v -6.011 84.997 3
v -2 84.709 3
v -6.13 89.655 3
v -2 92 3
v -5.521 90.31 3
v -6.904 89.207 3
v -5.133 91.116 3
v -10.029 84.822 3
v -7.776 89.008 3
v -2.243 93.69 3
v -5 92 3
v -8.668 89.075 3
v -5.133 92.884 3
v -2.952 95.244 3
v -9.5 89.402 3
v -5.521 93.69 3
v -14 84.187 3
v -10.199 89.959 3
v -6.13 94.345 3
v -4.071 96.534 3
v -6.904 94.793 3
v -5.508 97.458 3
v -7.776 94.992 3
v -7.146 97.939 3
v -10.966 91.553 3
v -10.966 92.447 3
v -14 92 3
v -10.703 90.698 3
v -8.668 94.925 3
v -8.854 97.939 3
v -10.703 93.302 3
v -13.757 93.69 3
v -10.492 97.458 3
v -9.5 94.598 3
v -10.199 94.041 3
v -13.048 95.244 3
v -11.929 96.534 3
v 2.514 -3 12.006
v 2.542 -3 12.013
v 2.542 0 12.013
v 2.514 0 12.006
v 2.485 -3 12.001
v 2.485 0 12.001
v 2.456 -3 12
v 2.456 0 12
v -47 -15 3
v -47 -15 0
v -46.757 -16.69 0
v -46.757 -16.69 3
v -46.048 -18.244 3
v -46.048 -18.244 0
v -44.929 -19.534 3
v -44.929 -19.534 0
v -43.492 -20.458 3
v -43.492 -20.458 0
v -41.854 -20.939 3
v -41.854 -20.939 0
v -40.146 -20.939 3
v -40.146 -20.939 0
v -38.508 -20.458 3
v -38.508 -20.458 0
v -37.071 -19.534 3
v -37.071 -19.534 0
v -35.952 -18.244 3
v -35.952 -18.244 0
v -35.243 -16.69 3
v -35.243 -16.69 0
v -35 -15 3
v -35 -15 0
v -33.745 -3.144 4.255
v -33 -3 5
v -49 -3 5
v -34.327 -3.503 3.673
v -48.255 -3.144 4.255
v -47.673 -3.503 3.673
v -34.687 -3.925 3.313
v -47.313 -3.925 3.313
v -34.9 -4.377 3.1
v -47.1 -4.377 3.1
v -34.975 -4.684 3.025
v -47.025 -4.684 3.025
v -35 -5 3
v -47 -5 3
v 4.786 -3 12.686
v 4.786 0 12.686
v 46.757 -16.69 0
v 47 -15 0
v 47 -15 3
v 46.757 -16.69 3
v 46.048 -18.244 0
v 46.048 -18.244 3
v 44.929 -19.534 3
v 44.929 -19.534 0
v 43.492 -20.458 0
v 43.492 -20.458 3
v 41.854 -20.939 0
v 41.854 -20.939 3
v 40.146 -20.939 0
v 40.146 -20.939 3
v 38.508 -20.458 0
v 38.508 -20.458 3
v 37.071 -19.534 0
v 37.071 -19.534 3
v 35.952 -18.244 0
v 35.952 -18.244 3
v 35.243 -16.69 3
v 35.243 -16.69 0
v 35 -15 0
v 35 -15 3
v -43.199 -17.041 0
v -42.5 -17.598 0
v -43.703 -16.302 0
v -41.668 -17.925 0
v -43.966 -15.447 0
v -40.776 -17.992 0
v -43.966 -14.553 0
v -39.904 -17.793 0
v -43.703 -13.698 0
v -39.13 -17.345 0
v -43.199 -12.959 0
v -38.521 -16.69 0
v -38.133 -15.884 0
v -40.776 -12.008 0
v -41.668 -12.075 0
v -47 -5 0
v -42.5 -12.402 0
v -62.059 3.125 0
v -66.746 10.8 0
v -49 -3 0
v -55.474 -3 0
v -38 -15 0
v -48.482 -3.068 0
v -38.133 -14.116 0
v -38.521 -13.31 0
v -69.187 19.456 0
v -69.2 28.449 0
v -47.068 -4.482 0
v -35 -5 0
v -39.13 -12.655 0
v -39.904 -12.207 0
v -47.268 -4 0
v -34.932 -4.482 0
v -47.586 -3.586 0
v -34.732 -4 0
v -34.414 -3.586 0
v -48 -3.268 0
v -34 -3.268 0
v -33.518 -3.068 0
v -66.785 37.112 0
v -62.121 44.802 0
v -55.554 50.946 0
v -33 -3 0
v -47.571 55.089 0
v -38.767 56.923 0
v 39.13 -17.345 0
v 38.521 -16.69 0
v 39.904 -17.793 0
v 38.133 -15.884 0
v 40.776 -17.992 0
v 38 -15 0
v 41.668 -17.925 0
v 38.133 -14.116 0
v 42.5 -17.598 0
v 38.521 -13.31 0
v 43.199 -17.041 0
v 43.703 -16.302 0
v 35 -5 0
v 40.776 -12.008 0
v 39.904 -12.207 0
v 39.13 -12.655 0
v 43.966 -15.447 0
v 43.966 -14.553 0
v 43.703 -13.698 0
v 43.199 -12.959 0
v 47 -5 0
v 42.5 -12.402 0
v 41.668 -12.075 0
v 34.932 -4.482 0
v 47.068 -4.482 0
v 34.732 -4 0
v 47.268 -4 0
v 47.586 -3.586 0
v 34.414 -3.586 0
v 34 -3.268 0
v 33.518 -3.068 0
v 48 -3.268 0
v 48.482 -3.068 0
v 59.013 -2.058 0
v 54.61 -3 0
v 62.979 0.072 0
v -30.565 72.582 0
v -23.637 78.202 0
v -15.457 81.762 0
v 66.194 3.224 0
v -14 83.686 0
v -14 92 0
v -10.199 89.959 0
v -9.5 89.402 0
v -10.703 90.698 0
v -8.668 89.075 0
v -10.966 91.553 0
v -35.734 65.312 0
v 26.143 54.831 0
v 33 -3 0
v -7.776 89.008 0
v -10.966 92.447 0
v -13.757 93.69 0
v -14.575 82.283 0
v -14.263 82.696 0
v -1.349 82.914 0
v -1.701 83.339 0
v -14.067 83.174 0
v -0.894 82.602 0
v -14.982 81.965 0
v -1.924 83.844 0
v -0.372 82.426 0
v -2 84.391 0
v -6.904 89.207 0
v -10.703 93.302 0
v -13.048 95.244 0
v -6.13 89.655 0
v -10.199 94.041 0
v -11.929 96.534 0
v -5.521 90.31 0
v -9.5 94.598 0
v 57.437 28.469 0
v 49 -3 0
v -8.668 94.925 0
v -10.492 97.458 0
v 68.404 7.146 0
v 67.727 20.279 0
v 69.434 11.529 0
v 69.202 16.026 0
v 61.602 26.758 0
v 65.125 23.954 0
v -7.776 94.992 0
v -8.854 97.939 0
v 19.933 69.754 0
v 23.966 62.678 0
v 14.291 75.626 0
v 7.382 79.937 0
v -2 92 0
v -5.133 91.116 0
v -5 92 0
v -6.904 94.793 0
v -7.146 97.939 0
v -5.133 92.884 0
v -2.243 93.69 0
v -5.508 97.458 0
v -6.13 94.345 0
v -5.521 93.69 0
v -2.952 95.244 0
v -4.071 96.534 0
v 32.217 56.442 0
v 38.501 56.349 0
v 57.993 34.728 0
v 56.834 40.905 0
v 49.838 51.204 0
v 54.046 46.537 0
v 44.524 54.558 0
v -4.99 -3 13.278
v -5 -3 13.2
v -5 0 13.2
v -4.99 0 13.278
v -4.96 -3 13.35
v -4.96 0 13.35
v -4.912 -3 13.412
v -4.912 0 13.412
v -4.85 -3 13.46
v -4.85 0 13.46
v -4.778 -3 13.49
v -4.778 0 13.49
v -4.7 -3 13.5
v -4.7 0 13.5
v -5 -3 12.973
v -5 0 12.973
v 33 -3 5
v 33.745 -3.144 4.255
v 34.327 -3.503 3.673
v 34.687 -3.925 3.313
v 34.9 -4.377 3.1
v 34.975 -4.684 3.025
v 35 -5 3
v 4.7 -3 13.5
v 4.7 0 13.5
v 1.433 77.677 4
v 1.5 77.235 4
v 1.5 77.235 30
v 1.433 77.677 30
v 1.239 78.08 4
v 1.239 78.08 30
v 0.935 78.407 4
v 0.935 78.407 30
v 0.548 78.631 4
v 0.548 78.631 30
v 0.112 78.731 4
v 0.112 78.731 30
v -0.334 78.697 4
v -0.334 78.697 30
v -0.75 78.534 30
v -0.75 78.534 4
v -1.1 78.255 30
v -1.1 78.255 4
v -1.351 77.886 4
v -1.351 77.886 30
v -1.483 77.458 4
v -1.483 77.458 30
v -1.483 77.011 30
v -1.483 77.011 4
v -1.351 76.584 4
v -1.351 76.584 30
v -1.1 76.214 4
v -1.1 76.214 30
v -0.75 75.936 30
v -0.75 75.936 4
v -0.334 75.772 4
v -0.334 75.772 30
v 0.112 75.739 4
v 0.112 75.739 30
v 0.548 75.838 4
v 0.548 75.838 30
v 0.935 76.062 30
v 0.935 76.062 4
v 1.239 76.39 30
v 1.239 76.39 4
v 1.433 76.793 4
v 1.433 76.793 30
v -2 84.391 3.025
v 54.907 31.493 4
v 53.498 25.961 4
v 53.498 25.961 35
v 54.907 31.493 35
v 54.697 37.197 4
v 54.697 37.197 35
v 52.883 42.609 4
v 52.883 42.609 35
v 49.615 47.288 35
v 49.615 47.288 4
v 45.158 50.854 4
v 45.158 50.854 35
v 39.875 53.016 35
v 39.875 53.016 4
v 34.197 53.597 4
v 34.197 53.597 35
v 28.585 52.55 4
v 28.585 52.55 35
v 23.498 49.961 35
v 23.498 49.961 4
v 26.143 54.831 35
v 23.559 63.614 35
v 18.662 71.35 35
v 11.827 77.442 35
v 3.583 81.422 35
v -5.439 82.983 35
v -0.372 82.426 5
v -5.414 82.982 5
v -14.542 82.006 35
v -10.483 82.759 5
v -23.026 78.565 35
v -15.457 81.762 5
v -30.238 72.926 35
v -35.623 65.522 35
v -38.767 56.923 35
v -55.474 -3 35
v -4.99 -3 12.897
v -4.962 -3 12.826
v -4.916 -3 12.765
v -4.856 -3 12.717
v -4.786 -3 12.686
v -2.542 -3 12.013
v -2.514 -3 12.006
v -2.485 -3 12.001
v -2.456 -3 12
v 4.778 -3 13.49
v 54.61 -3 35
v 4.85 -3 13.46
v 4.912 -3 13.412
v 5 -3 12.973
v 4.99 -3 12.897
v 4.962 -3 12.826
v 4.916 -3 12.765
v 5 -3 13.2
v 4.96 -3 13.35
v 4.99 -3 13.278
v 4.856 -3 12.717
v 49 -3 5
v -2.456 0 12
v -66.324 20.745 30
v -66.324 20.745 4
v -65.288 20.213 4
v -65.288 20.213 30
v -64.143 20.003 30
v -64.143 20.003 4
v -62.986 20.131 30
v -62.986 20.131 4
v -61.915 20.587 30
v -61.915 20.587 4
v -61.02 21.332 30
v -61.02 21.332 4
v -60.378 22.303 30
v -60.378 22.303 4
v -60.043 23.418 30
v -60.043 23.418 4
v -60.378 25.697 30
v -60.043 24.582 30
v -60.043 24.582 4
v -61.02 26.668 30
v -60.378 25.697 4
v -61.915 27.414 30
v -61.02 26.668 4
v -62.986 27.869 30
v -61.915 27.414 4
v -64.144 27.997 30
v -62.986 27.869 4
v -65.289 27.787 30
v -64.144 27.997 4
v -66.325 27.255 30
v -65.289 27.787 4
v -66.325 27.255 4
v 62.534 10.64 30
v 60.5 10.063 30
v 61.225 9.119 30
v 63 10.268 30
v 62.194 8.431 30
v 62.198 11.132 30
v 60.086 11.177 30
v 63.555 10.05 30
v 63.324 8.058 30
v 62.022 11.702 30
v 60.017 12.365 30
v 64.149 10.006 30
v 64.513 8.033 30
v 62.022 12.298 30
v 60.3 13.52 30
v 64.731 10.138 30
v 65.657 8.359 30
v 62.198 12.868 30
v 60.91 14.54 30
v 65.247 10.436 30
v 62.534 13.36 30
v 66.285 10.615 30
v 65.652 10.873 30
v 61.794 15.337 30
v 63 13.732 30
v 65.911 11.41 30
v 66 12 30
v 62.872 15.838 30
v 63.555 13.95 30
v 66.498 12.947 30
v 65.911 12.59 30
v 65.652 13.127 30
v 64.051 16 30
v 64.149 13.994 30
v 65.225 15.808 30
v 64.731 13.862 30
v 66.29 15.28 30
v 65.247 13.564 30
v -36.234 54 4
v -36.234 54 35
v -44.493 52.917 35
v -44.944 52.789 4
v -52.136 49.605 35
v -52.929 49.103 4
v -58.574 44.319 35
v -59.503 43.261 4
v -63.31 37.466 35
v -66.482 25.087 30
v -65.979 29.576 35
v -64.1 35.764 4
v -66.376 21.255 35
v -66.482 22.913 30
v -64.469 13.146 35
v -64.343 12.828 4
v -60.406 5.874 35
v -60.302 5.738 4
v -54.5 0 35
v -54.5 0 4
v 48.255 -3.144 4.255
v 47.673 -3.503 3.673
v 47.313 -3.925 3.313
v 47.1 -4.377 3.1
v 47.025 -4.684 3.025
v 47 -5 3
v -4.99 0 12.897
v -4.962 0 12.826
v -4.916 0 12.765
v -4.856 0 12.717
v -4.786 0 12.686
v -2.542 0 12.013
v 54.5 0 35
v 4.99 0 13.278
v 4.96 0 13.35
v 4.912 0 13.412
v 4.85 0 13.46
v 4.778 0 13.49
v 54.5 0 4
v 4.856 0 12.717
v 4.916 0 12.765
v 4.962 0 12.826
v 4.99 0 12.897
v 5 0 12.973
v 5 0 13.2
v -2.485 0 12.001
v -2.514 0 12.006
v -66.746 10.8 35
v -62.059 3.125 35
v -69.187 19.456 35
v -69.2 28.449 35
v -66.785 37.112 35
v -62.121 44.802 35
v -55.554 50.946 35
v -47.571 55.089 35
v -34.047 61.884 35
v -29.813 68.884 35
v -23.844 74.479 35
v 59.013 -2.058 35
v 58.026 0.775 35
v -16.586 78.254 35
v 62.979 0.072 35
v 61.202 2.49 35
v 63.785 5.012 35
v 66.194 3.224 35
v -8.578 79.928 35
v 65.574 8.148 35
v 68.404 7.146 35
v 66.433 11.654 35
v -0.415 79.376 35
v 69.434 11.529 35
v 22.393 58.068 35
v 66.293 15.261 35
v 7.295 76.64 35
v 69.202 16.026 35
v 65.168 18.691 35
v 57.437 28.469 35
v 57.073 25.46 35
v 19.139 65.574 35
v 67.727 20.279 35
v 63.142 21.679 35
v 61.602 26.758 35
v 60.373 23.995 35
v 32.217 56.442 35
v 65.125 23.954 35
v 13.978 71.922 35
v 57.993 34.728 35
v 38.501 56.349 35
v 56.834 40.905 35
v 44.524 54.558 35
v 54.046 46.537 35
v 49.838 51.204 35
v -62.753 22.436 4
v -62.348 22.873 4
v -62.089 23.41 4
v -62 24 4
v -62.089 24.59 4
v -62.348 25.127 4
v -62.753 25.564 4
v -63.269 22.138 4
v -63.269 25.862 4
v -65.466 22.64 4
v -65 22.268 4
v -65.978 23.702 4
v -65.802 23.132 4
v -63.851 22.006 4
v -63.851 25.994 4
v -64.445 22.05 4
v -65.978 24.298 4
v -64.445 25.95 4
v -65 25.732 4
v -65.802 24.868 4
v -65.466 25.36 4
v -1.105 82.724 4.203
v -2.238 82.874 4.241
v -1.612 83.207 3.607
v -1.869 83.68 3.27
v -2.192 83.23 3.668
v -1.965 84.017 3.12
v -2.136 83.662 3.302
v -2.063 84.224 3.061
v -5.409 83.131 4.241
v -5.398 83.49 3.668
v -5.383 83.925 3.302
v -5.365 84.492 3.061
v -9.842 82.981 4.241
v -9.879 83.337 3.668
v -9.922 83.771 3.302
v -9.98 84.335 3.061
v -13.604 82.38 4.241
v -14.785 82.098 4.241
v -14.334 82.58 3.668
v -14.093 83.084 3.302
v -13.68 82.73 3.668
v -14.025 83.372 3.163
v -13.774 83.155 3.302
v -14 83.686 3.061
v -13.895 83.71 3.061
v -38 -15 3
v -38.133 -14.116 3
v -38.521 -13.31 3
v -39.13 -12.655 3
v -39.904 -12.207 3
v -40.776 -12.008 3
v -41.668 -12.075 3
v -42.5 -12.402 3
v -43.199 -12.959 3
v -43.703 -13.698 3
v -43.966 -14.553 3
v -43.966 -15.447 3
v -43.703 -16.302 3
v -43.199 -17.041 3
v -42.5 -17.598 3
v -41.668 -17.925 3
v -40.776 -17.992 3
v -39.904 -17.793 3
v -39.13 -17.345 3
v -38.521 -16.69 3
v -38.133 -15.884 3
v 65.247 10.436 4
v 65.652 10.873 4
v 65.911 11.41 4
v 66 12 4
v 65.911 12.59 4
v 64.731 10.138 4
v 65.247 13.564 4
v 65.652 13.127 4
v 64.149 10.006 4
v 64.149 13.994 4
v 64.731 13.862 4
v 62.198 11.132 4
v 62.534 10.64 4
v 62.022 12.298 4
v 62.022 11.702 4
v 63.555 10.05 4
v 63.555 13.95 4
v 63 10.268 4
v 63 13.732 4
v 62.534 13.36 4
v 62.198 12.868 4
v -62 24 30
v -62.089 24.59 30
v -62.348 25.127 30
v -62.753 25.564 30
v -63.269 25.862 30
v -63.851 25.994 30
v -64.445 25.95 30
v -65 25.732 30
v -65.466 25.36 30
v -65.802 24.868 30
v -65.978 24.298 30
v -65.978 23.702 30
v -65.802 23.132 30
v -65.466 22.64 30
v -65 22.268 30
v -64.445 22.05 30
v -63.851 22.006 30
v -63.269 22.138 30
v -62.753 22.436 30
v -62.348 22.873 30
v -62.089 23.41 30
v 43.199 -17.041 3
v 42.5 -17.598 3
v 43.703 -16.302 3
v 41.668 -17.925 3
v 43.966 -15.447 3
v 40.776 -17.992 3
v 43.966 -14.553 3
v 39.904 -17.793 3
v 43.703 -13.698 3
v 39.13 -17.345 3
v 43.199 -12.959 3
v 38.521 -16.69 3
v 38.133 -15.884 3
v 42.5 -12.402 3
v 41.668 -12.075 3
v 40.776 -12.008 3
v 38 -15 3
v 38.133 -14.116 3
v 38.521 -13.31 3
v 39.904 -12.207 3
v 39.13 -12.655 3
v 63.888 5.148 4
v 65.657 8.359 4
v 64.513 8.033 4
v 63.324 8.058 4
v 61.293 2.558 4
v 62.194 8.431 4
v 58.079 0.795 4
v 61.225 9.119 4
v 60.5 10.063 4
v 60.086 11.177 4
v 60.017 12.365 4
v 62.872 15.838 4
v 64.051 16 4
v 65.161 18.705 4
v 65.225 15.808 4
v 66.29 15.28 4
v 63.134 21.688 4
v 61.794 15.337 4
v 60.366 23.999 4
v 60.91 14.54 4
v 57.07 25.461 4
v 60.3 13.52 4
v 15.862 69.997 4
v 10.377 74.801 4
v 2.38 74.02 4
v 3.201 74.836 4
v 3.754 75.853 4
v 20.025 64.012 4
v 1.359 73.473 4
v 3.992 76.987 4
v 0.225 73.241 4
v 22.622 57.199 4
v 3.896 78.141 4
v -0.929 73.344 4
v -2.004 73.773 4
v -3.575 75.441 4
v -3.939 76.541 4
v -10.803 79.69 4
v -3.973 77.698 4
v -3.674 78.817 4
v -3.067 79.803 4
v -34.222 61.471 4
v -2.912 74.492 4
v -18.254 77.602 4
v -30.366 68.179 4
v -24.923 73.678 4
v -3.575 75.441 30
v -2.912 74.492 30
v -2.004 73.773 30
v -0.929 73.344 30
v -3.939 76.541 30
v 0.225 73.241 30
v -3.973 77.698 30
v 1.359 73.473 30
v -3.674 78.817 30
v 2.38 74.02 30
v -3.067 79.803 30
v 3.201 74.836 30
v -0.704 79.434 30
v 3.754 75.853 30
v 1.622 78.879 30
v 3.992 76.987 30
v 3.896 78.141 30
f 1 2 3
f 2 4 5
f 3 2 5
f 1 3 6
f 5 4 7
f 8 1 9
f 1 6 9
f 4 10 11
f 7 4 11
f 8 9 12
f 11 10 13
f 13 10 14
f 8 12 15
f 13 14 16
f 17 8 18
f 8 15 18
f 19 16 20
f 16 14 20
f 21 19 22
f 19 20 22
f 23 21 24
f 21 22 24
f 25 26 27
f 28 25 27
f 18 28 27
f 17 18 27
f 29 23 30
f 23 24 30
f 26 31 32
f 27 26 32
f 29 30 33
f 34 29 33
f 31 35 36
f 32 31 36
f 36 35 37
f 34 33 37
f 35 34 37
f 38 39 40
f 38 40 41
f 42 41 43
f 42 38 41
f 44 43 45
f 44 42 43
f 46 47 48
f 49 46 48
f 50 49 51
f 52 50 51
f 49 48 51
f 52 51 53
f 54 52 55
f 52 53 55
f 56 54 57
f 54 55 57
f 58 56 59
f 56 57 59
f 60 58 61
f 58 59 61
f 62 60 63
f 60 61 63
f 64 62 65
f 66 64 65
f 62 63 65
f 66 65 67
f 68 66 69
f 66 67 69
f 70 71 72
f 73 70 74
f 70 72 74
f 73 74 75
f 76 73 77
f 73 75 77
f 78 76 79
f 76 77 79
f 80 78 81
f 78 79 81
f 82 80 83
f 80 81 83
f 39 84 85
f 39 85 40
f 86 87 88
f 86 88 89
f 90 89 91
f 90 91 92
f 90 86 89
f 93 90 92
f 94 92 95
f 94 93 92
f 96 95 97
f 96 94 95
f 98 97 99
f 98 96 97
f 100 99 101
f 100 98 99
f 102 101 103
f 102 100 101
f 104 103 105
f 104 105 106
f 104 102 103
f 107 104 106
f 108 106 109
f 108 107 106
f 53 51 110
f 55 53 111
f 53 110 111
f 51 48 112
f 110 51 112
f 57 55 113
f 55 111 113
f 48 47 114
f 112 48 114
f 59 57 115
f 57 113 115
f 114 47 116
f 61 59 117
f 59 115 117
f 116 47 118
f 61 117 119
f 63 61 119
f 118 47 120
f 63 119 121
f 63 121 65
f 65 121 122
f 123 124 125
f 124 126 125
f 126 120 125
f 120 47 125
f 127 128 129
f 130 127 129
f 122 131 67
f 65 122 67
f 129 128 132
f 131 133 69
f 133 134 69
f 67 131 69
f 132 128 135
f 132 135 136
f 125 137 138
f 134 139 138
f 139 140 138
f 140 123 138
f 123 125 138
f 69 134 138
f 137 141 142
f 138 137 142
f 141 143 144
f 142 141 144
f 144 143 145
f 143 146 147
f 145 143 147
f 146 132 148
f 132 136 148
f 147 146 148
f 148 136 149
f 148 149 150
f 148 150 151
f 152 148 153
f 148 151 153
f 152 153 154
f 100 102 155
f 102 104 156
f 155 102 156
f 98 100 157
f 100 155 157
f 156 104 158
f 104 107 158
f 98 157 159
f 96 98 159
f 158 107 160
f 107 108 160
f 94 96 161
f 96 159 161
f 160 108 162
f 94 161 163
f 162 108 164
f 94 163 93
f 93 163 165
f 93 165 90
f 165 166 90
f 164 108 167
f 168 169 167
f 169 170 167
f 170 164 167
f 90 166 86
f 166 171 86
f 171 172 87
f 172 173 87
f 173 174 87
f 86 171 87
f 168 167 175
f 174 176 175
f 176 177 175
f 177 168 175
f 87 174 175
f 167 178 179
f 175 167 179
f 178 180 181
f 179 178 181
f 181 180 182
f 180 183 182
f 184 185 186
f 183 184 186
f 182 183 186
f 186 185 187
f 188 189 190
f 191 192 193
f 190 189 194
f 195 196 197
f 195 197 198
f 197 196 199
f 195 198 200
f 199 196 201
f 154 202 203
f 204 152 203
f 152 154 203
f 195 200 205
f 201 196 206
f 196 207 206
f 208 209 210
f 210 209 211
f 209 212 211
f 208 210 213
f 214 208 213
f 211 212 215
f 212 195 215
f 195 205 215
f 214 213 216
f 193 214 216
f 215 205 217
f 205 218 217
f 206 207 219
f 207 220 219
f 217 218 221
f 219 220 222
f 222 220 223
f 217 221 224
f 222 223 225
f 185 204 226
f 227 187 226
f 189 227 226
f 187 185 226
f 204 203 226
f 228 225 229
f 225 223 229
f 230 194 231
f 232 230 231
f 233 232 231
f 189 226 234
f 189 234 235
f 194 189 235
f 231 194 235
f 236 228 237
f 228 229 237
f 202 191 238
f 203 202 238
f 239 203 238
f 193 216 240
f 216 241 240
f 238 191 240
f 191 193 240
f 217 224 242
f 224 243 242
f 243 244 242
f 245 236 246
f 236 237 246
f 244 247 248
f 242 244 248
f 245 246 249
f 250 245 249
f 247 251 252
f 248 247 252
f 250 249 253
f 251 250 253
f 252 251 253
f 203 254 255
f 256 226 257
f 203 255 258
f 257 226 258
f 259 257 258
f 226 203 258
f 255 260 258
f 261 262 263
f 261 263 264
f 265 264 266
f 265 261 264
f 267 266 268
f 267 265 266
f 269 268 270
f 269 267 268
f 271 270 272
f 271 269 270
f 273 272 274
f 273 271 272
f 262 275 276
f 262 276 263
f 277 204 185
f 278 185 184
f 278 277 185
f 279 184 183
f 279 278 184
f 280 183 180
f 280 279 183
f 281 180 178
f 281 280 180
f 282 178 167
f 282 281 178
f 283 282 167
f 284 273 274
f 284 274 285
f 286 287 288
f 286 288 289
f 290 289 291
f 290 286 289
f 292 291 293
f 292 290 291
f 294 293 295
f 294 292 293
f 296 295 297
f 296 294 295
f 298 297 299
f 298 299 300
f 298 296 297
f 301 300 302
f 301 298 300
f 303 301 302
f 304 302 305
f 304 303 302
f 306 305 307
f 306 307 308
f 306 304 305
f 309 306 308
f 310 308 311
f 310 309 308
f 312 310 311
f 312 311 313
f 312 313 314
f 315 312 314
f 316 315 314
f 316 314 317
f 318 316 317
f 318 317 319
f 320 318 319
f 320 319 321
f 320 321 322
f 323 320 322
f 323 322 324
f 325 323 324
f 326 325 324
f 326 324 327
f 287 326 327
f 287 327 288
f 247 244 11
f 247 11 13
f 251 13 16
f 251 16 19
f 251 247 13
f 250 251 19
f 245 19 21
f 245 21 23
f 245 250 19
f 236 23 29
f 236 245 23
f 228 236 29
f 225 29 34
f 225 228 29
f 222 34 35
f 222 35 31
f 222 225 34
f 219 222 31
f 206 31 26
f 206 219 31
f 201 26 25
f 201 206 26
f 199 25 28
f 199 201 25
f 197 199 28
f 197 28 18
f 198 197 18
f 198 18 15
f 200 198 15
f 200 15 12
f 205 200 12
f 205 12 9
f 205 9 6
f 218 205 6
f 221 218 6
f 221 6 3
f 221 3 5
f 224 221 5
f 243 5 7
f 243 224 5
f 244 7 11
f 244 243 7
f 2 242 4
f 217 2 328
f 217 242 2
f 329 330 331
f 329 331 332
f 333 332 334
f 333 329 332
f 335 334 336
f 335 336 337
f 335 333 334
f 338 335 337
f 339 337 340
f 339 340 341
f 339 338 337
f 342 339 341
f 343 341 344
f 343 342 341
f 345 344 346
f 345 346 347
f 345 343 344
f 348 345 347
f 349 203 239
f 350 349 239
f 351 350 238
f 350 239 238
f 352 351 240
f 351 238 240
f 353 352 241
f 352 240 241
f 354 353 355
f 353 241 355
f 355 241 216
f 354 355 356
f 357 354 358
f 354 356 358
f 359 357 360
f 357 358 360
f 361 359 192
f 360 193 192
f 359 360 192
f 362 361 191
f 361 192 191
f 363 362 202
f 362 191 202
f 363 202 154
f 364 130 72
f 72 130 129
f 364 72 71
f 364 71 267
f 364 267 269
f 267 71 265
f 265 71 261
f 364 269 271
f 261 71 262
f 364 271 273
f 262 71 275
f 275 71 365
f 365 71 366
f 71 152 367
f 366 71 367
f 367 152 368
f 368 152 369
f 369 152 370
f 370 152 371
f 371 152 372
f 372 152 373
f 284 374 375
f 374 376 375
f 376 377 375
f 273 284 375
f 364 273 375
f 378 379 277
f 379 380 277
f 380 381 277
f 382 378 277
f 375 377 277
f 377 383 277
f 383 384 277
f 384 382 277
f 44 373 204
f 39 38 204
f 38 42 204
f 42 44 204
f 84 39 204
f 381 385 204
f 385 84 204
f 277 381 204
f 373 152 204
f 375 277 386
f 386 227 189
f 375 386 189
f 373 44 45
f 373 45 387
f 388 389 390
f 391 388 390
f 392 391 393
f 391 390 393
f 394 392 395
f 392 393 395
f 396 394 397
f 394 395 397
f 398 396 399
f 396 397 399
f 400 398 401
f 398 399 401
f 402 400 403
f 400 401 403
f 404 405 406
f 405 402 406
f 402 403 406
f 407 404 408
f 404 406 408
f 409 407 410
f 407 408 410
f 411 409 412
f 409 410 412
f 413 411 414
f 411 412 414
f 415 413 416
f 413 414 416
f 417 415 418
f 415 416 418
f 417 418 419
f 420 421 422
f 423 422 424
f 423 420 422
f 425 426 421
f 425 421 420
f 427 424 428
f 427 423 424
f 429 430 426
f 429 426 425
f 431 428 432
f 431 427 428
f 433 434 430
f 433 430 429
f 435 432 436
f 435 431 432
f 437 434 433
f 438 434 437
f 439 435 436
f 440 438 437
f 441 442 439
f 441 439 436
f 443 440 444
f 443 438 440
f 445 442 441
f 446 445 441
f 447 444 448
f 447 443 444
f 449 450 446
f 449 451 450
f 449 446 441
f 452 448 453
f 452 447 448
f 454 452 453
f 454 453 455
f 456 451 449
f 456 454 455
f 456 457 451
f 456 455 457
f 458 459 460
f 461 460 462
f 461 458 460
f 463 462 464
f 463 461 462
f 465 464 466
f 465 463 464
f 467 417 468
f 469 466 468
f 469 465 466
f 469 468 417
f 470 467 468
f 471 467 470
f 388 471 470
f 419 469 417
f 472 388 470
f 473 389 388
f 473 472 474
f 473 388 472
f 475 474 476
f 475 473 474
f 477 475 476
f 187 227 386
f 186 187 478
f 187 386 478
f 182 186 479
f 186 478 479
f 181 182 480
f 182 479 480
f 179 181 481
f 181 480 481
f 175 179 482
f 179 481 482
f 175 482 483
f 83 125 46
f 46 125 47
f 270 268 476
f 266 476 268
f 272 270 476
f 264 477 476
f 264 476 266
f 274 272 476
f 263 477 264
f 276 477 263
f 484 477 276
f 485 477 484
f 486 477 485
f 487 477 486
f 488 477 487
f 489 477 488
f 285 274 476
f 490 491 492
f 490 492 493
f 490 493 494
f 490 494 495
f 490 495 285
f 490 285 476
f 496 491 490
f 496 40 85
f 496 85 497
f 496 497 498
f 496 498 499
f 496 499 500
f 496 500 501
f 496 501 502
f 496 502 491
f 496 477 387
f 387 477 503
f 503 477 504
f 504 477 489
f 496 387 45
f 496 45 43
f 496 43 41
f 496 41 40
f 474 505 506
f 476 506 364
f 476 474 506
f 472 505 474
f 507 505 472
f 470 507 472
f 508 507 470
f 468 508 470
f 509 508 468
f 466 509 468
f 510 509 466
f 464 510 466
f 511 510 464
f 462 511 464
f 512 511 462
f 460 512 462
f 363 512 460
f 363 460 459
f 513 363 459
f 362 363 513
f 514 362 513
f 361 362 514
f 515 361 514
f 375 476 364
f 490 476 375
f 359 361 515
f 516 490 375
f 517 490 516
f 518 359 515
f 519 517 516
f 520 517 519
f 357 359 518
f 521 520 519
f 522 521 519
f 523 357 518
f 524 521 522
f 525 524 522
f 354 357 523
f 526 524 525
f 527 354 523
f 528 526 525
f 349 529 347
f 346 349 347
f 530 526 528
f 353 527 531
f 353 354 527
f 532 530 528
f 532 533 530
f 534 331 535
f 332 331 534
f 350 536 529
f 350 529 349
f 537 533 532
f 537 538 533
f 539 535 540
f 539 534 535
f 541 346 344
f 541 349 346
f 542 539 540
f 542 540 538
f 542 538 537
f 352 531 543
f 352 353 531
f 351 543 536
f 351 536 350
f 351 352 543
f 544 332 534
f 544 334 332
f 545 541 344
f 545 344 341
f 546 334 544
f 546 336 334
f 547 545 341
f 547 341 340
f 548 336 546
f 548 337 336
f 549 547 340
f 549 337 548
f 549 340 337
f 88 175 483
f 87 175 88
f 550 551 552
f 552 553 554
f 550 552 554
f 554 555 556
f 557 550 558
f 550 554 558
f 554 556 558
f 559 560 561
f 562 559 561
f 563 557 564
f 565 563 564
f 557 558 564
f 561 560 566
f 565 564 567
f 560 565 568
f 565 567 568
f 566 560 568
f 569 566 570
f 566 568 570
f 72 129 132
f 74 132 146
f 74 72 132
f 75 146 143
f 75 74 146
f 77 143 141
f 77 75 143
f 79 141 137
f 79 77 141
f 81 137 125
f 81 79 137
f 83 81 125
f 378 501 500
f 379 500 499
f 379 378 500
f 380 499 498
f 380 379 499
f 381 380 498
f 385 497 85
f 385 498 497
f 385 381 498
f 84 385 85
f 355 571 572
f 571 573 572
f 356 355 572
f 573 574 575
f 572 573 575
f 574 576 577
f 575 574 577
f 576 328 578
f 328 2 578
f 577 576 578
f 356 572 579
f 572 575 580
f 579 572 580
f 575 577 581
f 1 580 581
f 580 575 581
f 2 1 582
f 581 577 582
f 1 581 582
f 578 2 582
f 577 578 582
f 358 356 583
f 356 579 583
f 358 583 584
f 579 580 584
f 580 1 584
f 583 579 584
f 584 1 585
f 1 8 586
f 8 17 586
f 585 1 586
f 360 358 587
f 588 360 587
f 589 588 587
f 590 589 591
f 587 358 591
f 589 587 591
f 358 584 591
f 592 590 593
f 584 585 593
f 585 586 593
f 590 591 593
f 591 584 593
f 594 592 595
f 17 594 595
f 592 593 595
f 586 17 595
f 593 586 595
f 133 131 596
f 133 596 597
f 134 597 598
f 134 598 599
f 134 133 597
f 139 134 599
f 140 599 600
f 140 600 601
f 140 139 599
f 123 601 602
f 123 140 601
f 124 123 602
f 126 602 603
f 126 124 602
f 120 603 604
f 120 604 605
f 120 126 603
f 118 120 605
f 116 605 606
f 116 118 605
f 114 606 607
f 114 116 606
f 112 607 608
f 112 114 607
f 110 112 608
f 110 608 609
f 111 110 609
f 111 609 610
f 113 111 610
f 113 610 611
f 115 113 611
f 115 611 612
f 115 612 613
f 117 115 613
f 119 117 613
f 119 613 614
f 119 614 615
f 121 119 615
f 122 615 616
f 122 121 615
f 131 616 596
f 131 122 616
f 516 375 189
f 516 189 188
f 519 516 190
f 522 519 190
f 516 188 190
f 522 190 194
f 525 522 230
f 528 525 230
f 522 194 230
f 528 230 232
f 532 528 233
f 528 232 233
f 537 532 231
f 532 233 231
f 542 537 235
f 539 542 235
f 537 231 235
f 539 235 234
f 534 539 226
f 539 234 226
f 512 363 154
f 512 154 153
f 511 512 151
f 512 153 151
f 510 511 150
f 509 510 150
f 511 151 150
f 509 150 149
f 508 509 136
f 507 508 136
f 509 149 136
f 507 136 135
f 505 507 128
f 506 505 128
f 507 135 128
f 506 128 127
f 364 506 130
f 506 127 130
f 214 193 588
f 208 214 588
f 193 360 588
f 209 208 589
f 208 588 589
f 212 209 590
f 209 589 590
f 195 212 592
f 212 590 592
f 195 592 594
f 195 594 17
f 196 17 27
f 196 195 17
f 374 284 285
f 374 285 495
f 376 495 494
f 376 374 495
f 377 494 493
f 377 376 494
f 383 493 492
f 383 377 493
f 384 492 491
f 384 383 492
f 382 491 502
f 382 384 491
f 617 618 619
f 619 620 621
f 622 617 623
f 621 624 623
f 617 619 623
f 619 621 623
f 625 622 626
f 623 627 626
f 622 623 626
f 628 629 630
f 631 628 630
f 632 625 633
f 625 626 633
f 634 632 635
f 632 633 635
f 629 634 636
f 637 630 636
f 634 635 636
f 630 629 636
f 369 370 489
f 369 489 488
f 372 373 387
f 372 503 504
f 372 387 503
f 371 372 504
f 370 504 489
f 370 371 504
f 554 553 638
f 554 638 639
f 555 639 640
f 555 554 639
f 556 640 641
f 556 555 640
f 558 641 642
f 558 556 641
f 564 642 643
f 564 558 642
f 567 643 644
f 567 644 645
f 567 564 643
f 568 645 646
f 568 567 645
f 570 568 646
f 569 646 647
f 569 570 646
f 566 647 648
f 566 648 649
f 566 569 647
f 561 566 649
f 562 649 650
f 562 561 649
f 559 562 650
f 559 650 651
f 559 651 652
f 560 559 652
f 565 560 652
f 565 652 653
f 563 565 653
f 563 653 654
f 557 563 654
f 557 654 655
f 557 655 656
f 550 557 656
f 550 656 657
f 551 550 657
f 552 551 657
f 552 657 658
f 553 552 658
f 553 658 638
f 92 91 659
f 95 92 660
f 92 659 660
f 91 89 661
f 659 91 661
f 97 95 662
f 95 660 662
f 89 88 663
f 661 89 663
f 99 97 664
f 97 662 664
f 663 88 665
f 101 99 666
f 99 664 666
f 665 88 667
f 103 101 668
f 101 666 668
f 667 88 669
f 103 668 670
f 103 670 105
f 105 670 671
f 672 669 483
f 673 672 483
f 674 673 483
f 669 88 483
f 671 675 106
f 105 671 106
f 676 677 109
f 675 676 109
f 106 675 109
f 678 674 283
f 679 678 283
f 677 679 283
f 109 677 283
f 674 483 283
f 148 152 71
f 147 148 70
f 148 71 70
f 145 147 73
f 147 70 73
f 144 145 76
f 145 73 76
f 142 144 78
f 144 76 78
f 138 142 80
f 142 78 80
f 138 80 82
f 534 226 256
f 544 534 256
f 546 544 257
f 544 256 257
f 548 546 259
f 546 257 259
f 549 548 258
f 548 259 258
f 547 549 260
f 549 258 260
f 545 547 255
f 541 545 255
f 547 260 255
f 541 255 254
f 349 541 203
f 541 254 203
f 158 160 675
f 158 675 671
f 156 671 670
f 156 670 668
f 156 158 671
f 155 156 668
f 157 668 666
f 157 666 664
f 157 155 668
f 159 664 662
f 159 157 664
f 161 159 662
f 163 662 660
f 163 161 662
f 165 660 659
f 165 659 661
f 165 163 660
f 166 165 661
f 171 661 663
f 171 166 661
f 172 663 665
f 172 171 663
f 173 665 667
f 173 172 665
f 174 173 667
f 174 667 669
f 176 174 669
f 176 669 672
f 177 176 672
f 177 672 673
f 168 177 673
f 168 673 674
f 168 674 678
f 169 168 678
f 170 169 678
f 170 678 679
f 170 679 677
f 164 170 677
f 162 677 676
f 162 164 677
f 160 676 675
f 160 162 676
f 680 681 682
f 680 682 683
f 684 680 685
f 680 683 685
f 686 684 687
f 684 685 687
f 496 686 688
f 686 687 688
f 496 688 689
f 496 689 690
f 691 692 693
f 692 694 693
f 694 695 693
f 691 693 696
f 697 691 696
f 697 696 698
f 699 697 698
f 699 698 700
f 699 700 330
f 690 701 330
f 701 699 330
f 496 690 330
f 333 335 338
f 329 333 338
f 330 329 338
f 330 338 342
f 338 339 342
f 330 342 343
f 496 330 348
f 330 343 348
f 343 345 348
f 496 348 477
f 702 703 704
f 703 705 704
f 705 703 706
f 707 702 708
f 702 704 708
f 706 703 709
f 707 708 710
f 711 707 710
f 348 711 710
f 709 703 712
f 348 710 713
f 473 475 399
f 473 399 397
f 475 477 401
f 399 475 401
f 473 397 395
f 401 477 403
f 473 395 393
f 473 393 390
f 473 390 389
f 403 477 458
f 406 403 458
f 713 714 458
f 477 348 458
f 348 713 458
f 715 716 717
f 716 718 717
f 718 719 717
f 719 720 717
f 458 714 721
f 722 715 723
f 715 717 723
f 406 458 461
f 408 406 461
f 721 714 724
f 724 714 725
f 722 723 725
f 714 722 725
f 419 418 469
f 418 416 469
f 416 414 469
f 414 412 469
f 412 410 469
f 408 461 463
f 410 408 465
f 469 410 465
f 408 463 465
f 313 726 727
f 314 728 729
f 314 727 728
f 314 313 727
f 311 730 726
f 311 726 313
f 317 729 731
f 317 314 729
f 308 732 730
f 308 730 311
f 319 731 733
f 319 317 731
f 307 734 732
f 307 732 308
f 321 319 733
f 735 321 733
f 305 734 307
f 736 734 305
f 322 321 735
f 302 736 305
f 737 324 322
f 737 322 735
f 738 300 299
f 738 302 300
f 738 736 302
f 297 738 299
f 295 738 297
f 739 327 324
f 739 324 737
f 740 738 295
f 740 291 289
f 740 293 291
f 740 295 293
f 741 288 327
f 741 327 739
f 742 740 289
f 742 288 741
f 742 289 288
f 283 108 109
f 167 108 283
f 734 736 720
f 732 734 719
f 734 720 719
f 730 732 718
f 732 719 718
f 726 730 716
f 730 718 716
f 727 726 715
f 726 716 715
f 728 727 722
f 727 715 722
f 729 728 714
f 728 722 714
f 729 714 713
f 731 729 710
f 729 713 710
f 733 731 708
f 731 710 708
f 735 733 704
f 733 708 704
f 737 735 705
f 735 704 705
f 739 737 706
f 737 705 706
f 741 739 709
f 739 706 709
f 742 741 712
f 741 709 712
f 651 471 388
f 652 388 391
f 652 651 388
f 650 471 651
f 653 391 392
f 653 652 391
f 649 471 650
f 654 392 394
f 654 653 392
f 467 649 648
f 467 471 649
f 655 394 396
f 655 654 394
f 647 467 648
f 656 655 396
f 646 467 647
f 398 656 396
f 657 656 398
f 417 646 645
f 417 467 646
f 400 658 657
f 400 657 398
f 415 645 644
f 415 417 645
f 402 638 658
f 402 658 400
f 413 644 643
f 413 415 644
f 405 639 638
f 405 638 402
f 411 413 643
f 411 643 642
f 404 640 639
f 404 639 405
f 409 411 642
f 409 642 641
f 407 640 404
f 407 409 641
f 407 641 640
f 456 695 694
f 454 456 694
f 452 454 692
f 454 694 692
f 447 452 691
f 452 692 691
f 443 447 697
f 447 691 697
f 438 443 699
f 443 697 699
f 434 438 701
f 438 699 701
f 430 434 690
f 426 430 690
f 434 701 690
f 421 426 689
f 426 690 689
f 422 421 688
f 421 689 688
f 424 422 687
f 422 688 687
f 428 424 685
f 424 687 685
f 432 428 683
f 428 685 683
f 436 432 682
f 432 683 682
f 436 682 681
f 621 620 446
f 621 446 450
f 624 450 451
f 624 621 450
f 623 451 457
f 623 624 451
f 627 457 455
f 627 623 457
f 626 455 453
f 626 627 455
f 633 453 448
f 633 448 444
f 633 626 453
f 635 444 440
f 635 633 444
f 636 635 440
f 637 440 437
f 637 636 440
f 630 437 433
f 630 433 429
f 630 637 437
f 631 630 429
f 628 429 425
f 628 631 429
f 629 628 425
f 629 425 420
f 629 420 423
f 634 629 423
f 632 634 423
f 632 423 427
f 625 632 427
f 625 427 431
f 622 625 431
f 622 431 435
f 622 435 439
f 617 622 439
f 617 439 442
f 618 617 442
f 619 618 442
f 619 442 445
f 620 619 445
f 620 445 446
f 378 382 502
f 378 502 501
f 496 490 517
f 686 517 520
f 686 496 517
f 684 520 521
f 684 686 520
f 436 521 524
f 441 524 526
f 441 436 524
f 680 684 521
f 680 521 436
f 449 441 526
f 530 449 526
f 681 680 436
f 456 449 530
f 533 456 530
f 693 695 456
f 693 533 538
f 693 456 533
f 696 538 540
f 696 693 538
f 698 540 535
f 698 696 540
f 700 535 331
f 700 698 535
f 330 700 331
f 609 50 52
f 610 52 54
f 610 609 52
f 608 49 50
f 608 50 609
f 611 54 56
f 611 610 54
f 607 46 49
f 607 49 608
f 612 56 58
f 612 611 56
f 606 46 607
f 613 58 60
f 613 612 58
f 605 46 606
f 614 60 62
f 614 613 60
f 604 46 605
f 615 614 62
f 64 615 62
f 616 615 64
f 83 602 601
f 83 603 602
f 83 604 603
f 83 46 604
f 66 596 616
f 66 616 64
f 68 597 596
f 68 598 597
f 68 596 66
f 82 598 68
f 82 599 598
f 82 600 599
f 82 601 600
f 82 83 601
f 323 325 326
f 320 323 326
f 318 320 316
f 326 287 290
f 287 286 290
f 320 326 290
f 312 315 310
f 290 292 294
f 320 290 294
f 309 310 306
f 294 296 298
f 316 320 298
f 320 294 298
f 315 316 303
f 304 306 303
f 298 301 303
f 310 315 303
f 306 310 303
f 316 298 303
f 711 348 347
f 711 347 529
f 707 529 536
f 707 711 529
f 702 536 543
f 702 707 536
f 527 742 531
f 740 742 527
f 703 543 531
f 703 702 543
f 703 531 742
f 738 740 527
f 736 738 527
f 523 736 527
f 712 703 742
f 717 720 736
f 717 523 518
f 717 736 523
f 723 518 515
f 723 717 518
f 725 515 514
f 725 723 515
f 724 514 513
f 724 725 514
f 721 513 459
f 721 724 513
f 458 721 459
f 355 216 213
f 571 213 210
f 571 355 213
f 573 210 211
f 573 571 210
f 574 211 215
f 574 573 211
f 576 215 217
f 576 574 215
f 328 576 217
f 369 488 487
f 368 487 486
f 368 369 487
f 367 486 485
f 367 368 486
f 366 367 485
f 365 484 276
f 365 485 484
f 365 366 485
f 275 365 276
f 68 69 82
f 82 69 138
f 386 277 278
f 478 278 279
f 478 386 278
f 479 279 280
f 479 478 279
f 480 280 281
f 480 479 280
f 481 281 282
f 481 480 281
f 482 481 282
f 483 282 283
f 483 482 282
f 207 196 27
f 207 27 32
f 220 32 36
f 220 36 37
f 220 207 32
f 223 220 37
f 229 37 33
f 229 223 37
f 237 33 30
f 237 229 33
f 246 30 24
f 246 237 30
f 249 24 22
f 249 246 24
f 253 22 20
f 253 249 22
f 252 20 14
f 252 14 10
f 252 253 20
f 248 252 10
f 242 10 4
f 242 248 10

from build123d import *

# Parameters (mm, degrees)
BOSS_EXTRU_1_DEPTH      = 4
BOSS_EXTRU_3_DEPTH      = 35
ESQUISSE2_R             = 3
BOSS_EXTRU_2_DEPTH      = 3
ENL_V_MAT_EXTRU_1_REACH = 129.501
CONG_1_R                = 2
ESQUISSE7_R             = 4
ESQUISSE7_R_2           = 1.5
ESQUISSE7_R_3           = 2
BOSS_EXTRU_5_DEPTH      = 30


with BuildPart() as part:
    # Esquisse1 → Boss.-Extru.1 (new body)
    with BuildSketch(Plane.XY):
        with BuildLine():
            Line((54.5, 0), (-54.5, 0))
            ThreePointArc((-54.5, 0), (-64.919772429, 33.614061701), (-36.233707498, 54))
            ThreePointArc((-36.233707498, 54), (-4.477813337, 79.931662315), (23.49840511, 49.96135825))
            ThreePointArc((23.49840511, 49.96135825), (47.514151238, 49.231040909), (53.49840511, 25.96135825))
            ThreePointArc((53.49840511, 25.96135825), (66.48874108, 13.462528258), (54.5, 0))
        make_face()
    extrude(amount=BOSS_EXTRU_1_DEPTH)

    # Esquisse4 → Boss.-Extru.3 (add)
    with BuildSketch(Plane.XY):
        with BuildLine():
            Line((-55.473558679, -3), (54.609729917, -3))
            ThreePointArc((54.609729917, -3), (69.434198001, 11.529399821), (57.437462173, 28.468899301))
            ThreePointArc((57.437462173, 28.468899301), (49.838372291, 51.204095649), (26.142843315, 54.831384802))
            ThreePointArc((26.142843315, 54.831384802), (-5.438581775, 82.982875193), (-38.767146442, 56.92333569))
            ThreePointArc((-38.767146442, 56.92333569), (-68.289321366, 32.863500835), (-55.473558679, -3))
        make_face()
        with BuildLine():
            Line((-54.5, 0), (54.5, 0))
            ThreePointArc((54.5, 0), (66.48874108, 13.462528258), (53.49840511, 25.96135825))
            ThreePointArc((53.49840511, 25.96135825), (47.514151238, 49.231040909), (23.49840511, 49.96135825))
            ThreePointArc((23.49840511, 49.96135825), (-4.477813337, 79.931662315), (-36.233707498, 54))
            ThreePointArc((-36.233707498, 54), (-64.919772429, 33.614061701), (-54.5, 0))
        make_face(mode=Mode.SUBTRACT)
    extrude(amount=BOSS_EXTRU_3_DEPTH)

    # Esquisse2 → Boss.-Extru.2 (add)
    # profile 1 of 3: a face of its own
    with BuildSketch(Plane.XY):
        with BuildLine():
            Line((-47, -3), (-47, -15))
            ThreePointArc((-47, -15), (-41, -21), (-35, -15))
            Line((-35, -15), (-35, -3))
            Line((-35, -3), (-47, -3))
        make_face()
        with Locations((-41, -15)):
            Circle(ESQUISSE2_R, mode=Mode.SUBTRACT)
    # profile 2 of 3: a face of its own
    with BuildSketch(Plane.XY):
        with BuildLine():
            Line((35, -15), (35, -3))
            Line((35, -3), (47, -3))
            Line((47, -3), (47, -15))
            ThreePointArc((47, -15), (41, -21), (35, -15))
        make_face()
        with Locations(Location((41, -15, 0), (0, 0, 180))):
            Circle(ESQUISSE2_R, mode=Mode.SUBTRACT)
    # profile 3 of 3: a face of its own
    with BuildSketch(Plane.XY):
        with BuildLine():
            Line((-14, 82.136794295), (-14, 92))
            ThreePointArc((-14, 92), (-8, 98), (-2, 92))
            Line((-2, 92), (-2, 82.691525928))
            ThreePointArc((-2, 82.691525928), (-8.025454596, 82.964796006), (-14, 82.136794295))
        make_face()
        with Locations((-8, 92)):
            Circle(ESQUISSE2_R, mode=Mode.SUBTRACT)
    extrude(amount=BOSS_EXTRU_2_DEPTH)

    # Esquisse6 → Enlèv. mat.-Extru.1 (cut, up to next)
    with BuildSketch(Plane.XZ.offset(3), mode=Mode.PRIVATE) as enl_v_mat_extru_1_sk1:
        with BuildLine():
            Line((2.455969349, 12), (-2.455969349, 12))
            ThreePointArc((-2.455969349, 12), (-2.499533293, 12.003179881), (-2.542173715, 12.012652114))
            Line((-2.542173715, 12.012652114), (-4.786204366, 12.68586131))
            ThreePointArc((-4.786204366, 12.68586131), (-4.940687878, 12.794130036), (-5, 12.973209195))
            Line((-5, 12.973209195), (-5, 13.2))
            ThreePointArc((-5, 13.2), (-4.912132034, 13.412132034), (-4.7, 13.5))
            Line((-4.7, 13.5), (4.7, 13.5))
            ThreePointArc((4.7, 13.5), (4.912132034, 13.412132034), (5, 13.2))
            Line((5, 13.2), (5, 12.973209195))
            ThreePointArc((5, 12.973209195), (4.940687878, 12.794130036), (4.786204366, 12.68586131))
            Line((4.786204366, 12.68586131), (2.542173715, 12.012652114))
            ThreePointArc((2.542173715, 12.012652114), (2.499533293, 12.003179881), (2.455969349, 12))
        make_face()
    enl_v_mat_extru_1_tool1 = extrude(enl_v_mat_extru_1_sk1.sketch, amount=-ENL_V_MAT_EXTRU_1_REACH, mode=Mode.PRIVATE) & part.part
    add(enl_v_mat_extru_1_tool1.solids().sort_by_distance((0, -3, 12.819686))[0], mode=Mode.SUBTRACT)

    # Congé1
    cong_1_edges = [part.edges().sort_by_distance(p)[0] for p in [
        (-41, -3, 3),
        (-35, -3, 1.5),
        (-47, -3, 1.5),
        (-8.025454596, 82.964796006, 3),
        (-14, 82.136794295, 1.5),
        (-2, 82.691525928, 1.5),
        (41, -3, 3),
        (47, -3, 1.5),
        (35, -3, 1.5),
    ]]
    fillet(cong_1_edges, radius=CONG_1_R)

    # Esquisse7 → Boss.-Extru.5 (add)
    # profile 1 of 3: a face of its own
    with BuildSketch(Plane.XY):
        with Locations((0, 77.234712914)):
            Circle(ESQUISSE7_R)
        with Locations((0, 77.234712914)):
            Circle(ESQUISSE7_R_2, mode=Mode.SUBTRACT)
    # profile 2 of 3: a face of its own
    with BuildSketch(Plane.XY):
        with Locations((-64, 24)):
            Circle(ESQUISSE7_R)
        with Locations((-64, 24)):
            Circle(ESQUISSE7_R_3, mode=Mode.SUBTRACT)
    # profile 3 of 3: a face of its own
    with BuildSketch(Plane.XY):
        with Locations((64, 12)):
            Circle(ESQUISSE7_R)
        with Locations((64, 12)):
            Circle(ESQUISSE7_R_3, mode=Mode.SUBTRACT)
    extrude(amount=BOSS_EXTRU_5_DEPTH)


solid = part.part
